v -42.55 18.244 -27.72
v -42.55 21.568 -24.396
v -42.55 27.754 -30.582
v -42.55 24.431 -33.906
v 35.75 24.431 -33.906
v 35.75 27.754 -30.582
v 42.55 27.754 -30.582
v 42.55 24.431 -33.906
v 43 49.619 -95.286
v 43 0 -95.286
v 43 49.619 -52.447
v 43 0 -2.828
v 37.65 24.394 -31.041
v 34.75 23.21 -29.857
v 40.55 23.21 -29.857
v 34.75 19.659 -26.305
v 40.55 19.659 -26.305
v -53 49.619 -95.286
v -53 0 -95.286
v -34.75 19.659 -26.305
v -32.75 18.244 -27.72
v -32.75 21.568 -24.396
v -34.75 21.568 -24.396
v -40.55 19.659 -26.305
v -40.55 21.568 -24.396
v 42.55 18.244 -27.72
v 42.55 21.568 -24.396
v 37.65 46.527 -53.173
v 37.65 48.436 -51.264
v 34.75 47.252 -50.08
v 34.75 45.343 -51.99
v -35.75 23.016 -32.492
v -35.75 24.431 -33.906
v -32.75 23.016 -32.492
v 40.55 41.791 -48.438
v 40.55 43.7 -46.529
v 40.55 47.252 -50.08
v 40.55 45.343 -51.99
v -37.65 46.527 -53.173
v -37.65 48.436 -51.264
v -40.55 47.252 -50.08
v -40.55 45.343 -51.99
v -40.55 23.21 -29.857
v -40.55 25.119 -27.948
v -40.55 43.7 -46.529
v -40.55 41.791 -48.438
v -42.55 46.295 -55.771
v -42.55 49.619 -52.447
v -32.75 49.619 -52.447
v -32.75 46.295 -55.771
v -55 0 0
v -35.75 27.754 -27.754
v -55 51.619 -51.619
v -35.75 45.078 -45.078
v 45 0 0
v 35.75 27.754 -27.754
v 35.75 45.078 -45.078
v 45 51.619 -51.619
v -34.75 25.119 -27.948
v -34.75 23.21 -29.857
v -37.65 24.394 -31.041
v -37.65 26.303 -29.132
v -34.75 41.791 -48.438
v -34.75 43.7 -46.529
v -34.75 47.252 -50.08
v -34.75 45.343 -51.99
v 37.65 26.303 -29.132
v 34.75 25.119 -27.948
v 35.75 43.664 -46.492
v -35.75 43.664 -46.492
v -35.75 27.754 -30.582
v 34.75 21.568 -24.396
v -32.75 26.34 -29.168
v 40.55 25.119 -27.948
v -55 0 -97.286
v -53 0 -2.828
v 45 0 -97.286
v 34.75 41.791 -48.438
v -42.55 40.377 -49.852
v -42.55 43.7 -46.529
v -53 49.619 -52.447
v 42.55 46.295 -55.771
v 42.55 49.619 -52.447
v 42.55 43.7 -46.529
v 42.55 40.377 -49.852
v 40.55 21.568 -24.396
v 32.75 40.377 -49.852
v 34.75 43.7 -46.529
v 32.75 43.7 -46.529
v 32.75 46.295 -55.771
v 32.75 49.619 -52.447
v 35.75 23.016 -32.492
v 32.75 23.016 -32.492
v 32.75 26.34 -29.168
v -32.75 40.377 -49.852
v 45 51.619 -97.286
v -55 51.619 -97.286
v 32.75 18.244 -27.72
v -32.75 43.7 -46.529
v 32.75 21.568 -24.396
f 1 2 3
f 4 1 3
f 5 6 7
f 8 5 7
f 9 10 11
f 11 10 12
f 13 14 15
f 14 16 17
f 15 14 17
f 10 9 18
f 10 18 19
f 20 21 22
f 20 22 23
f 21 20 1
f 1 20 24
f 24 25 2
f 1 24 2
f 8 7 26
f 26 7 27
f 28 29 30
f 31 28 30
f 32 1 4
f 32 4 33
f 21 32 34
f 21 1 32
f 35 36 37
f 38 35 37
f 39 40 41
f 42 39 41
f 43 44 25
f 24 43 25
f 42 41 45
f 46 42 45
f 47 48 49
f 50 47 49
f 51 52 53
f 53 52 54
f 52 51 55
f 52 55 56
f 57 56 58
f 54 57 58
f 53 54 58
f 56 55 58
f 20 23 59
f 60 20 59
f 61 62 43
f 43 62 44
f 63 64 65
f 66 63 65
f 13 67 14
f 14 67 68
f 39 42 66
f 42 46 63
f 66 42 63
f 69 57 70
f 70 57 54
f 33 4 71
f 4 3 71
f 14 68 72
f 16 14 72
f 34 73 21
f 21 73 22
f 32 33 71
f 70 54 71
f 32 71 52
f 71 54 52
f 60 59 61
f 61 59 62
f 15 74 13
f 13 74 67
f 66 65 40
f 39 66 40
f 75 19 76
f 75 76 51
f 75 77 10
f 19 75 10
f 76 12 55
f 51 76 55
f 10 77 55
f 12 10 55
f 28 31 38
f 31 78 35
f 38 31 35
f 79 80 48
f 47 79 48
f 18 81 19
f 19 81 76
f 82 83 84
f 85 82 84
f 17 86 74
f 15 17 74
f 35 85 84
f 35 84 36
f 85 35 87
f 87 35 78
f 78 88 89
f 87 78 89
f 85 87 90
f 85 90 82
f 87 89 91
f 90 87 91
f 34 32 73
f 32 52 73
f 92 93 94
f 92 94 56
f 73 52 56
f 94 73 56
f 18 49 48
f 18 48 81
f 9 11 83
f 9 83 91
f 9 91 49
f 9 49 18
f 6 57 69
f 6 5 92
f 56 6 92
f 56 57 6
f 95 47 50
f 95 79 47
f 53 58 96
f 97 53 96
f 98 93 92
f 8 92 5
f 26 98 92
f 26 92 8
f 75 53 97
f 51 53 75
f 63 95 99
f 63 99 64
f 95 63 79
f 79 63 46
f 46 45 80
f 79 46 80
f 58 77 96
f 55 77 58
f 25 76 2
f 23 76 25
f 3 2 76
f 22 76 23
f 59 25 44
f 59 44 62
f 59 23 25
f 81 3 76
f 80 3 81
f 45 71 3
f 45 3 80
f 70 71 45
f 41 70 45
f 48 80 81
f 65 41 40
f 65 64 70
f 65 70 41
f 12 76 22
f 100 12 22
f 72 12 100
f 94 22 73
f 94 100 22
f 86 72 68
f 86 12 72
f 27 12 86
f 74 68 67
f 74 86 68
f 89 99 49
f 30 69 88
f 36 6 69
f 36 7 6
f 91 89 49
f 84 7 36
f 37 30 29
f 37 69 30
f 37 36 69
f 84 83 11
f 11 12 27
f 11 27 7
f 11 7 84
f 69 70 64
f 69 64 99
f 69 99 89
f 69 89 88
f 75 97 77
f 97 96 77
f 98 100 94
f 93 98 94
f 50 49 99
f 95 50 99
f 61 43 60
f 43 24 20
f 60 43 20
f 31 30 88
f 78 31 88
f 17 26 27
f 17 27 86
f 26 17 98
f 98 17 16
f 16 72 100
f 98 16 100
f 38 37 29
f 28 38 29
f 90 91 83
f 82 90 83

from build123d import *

# Parameters (mm, degrees)
F2_DEPTH  = 45
F4_DEPTH  = 10
F6_T      = -2
F5_W      = 71.5
F5_H      = 24.5
F7_DEPTH  = 2
F9_DEPTH  = 2.7
F11_DEPTH = 2


with BuildPart() as f2:
    # F1 (on Right) → F2 (new body, symmetric)
    with BuildSketch(Plane.YZ):
        Polygon((51.6187950266, -51.6187950266), (0, 0), (0, -97.2855082581), (51.6187950266, -97.2855082581), align=None)
    extrude(amount=F2_DEPTH, both=True)

    # F3 (on face) → F4 (join)
    with BuildSketch(Plane(origin=(-45, 0, 0), x_dir=(0, -1, 0), z_dir=(-1, 0, 0))):
        Polygon((-51.6187950266, -51.6187950266), (-51.6187950266, -97.2855082581), (0, -97.2855082581), (0, 0), align=None)
    extrude(amount=F4_DEPTH)

    # F6
    f6_openings = [f2.faces().sort_by_distance(p)[0] for p in [
        (-5, 0, -48.642754),
    ]]
    offset(amount=F6_T, openings=f6_openings)

    # F5 (on face) → F7 (cut, through all)
    with BuildSketch(Plane(origin=(0, 0, 0), x_dir=(-1, 0, 0), z_dir=(0, 0.7071067812, 0.7071067812))):
        with Locations((0, -51.5)):
            Rectangle(F5_W, F5_H)
    extrude(amount=-F7_DEPTH, mode=Mode.SUBTRACT)

    # F8 (on face) → F9 (join)
    with BuildSketch(Plane(origin=(0, -1.4142135624, -1.4142135624), x_dir=(1, 0, 0), z_dir=(0, -0.7071067812, -0.7071067812))):
        Polygon((-32.75, -63.8013684387), (-34.75, -63.8013684387), (-34.75, -65.4756842194), (-34.75, -68.8243157807), (-37.65, -70.4986315613), (-40.55, -68.8243157807), (-40.55, -65.4756842194), (-40.55, -63.8013684387), (-42.55, -63.8013684387), (-42.55, -72.1715728753), (-32.75, -72.1715728753), align=None)
        Polygon((-40.55, -32.5013684387), (-42.55, -32.5013684387), (-42.55, -39.25), (-42.55, -41.25), (-35.75, -41.25), (-35.75, -39.25), (-32.75, -39.25), (-32.75, -32.5013684387), (-34.75, -32.5013684387), (-34.75, -37.5243157807), (-37.65, -39.1986315613), (-40.55, -37.5243157807), align=None)
        Polygon((32.75, -32.5013684387), (32.75, -39.25), (35.75, -39.25), (35.75, -41.25), (42.55, -41.25), (42.55, -39.25), (42.55, -32.5013684387), (40.55, -32.5013684387), (40.55, -37.5243157807), (37.65, -39.1986315613), (34.75, -37.5243157807), (34.75, -32.5013684387), align=None)
        Polygon((34.75, -65.4756842194), (34.75, -63.8013684387), (32.75, -63.8013684387), (32.75, -72.1715728753), (42.55, -72.1715728753), (42.55, -63.8013684387), (40.55, -63.8013684387), (40.55, -65.4756842194), (40.55, -68.8243157807), (37.65, -70.4986315613), (34.75, -68.8243157807), align=None)
    extrude(amount=F9_DEPTH)

    # F10 (on face) → F11 (join)
    with BuildSketch(Plane(origin=(0, -3.3234018716, -3.3234018716), x_dir=(1, 0, 0), z_dir=(0, -0.7071067812, -0.7071067812))):
        Polygon((-42.55, -32.5013684387), (-42.55, -41.25), (-35.75, -41.25), (-35.75, -39.25), (-32.75, -39.25), (-32.75, -32.5013684387), align=None)
        Polygon((32.75, -39.25), (35.75, -39.25), (35.75, -41.25), (42.55, -41.25), (42.55, -32.5013684387), (40.55, -32.5013684387), (40.55, -37.5243157807), (37.65, -39.1986315613), (34.75, -37.5243157807), (34.75, -32.5013684387), (32.75, -32.5013684387), align=None)
        Polygon((40.55, -32.5013684387), (34.75, -32.5013684387), (34.75, -37.5243157807), (37.65, -39.1986315613), (40.55, -37.5243157807), align=None)
        Polygon((37.65, -70.4986315613), (34.75, -68.8243157807), (34.75, -63.8013684387), (32.75, -63.8013684387), (32.75, -72.1715728753), (42.55, -72.1715728753), (42.55, -63.8013684387), (40.55, -63.8013684387), (40.55, -68.8243157807), align=None)
        Polygon((34.75, -63.8013684387), (34.75, -68.8243157807), (37.65, -70.4986315613), (40.55, -68.8243157807), (40.55, -63.8013684387), align=None)
        Polygon((-42.55, -72.1715728753), (-32.75, -72.1715728753), (-32.75, -63.8013684387), (-34.75, -63.8013684387), (-34.75, -68.8243157807), (-37.65, -70.4986315613), (-40.55, -68.8243157807), (-40.55, -63.8013684387), (-42.55, -63.8013684387), align=None)
        Polygon((-34.75, -68.8243157807), (-34.75, -63.8013684387), (-40.55, -63.8013684387), (-40.55, -68.8243157807), (-37.65, -70.4986315613), align=None)
    extrude(amount=F11_DEPTH)


solid = f2.part
